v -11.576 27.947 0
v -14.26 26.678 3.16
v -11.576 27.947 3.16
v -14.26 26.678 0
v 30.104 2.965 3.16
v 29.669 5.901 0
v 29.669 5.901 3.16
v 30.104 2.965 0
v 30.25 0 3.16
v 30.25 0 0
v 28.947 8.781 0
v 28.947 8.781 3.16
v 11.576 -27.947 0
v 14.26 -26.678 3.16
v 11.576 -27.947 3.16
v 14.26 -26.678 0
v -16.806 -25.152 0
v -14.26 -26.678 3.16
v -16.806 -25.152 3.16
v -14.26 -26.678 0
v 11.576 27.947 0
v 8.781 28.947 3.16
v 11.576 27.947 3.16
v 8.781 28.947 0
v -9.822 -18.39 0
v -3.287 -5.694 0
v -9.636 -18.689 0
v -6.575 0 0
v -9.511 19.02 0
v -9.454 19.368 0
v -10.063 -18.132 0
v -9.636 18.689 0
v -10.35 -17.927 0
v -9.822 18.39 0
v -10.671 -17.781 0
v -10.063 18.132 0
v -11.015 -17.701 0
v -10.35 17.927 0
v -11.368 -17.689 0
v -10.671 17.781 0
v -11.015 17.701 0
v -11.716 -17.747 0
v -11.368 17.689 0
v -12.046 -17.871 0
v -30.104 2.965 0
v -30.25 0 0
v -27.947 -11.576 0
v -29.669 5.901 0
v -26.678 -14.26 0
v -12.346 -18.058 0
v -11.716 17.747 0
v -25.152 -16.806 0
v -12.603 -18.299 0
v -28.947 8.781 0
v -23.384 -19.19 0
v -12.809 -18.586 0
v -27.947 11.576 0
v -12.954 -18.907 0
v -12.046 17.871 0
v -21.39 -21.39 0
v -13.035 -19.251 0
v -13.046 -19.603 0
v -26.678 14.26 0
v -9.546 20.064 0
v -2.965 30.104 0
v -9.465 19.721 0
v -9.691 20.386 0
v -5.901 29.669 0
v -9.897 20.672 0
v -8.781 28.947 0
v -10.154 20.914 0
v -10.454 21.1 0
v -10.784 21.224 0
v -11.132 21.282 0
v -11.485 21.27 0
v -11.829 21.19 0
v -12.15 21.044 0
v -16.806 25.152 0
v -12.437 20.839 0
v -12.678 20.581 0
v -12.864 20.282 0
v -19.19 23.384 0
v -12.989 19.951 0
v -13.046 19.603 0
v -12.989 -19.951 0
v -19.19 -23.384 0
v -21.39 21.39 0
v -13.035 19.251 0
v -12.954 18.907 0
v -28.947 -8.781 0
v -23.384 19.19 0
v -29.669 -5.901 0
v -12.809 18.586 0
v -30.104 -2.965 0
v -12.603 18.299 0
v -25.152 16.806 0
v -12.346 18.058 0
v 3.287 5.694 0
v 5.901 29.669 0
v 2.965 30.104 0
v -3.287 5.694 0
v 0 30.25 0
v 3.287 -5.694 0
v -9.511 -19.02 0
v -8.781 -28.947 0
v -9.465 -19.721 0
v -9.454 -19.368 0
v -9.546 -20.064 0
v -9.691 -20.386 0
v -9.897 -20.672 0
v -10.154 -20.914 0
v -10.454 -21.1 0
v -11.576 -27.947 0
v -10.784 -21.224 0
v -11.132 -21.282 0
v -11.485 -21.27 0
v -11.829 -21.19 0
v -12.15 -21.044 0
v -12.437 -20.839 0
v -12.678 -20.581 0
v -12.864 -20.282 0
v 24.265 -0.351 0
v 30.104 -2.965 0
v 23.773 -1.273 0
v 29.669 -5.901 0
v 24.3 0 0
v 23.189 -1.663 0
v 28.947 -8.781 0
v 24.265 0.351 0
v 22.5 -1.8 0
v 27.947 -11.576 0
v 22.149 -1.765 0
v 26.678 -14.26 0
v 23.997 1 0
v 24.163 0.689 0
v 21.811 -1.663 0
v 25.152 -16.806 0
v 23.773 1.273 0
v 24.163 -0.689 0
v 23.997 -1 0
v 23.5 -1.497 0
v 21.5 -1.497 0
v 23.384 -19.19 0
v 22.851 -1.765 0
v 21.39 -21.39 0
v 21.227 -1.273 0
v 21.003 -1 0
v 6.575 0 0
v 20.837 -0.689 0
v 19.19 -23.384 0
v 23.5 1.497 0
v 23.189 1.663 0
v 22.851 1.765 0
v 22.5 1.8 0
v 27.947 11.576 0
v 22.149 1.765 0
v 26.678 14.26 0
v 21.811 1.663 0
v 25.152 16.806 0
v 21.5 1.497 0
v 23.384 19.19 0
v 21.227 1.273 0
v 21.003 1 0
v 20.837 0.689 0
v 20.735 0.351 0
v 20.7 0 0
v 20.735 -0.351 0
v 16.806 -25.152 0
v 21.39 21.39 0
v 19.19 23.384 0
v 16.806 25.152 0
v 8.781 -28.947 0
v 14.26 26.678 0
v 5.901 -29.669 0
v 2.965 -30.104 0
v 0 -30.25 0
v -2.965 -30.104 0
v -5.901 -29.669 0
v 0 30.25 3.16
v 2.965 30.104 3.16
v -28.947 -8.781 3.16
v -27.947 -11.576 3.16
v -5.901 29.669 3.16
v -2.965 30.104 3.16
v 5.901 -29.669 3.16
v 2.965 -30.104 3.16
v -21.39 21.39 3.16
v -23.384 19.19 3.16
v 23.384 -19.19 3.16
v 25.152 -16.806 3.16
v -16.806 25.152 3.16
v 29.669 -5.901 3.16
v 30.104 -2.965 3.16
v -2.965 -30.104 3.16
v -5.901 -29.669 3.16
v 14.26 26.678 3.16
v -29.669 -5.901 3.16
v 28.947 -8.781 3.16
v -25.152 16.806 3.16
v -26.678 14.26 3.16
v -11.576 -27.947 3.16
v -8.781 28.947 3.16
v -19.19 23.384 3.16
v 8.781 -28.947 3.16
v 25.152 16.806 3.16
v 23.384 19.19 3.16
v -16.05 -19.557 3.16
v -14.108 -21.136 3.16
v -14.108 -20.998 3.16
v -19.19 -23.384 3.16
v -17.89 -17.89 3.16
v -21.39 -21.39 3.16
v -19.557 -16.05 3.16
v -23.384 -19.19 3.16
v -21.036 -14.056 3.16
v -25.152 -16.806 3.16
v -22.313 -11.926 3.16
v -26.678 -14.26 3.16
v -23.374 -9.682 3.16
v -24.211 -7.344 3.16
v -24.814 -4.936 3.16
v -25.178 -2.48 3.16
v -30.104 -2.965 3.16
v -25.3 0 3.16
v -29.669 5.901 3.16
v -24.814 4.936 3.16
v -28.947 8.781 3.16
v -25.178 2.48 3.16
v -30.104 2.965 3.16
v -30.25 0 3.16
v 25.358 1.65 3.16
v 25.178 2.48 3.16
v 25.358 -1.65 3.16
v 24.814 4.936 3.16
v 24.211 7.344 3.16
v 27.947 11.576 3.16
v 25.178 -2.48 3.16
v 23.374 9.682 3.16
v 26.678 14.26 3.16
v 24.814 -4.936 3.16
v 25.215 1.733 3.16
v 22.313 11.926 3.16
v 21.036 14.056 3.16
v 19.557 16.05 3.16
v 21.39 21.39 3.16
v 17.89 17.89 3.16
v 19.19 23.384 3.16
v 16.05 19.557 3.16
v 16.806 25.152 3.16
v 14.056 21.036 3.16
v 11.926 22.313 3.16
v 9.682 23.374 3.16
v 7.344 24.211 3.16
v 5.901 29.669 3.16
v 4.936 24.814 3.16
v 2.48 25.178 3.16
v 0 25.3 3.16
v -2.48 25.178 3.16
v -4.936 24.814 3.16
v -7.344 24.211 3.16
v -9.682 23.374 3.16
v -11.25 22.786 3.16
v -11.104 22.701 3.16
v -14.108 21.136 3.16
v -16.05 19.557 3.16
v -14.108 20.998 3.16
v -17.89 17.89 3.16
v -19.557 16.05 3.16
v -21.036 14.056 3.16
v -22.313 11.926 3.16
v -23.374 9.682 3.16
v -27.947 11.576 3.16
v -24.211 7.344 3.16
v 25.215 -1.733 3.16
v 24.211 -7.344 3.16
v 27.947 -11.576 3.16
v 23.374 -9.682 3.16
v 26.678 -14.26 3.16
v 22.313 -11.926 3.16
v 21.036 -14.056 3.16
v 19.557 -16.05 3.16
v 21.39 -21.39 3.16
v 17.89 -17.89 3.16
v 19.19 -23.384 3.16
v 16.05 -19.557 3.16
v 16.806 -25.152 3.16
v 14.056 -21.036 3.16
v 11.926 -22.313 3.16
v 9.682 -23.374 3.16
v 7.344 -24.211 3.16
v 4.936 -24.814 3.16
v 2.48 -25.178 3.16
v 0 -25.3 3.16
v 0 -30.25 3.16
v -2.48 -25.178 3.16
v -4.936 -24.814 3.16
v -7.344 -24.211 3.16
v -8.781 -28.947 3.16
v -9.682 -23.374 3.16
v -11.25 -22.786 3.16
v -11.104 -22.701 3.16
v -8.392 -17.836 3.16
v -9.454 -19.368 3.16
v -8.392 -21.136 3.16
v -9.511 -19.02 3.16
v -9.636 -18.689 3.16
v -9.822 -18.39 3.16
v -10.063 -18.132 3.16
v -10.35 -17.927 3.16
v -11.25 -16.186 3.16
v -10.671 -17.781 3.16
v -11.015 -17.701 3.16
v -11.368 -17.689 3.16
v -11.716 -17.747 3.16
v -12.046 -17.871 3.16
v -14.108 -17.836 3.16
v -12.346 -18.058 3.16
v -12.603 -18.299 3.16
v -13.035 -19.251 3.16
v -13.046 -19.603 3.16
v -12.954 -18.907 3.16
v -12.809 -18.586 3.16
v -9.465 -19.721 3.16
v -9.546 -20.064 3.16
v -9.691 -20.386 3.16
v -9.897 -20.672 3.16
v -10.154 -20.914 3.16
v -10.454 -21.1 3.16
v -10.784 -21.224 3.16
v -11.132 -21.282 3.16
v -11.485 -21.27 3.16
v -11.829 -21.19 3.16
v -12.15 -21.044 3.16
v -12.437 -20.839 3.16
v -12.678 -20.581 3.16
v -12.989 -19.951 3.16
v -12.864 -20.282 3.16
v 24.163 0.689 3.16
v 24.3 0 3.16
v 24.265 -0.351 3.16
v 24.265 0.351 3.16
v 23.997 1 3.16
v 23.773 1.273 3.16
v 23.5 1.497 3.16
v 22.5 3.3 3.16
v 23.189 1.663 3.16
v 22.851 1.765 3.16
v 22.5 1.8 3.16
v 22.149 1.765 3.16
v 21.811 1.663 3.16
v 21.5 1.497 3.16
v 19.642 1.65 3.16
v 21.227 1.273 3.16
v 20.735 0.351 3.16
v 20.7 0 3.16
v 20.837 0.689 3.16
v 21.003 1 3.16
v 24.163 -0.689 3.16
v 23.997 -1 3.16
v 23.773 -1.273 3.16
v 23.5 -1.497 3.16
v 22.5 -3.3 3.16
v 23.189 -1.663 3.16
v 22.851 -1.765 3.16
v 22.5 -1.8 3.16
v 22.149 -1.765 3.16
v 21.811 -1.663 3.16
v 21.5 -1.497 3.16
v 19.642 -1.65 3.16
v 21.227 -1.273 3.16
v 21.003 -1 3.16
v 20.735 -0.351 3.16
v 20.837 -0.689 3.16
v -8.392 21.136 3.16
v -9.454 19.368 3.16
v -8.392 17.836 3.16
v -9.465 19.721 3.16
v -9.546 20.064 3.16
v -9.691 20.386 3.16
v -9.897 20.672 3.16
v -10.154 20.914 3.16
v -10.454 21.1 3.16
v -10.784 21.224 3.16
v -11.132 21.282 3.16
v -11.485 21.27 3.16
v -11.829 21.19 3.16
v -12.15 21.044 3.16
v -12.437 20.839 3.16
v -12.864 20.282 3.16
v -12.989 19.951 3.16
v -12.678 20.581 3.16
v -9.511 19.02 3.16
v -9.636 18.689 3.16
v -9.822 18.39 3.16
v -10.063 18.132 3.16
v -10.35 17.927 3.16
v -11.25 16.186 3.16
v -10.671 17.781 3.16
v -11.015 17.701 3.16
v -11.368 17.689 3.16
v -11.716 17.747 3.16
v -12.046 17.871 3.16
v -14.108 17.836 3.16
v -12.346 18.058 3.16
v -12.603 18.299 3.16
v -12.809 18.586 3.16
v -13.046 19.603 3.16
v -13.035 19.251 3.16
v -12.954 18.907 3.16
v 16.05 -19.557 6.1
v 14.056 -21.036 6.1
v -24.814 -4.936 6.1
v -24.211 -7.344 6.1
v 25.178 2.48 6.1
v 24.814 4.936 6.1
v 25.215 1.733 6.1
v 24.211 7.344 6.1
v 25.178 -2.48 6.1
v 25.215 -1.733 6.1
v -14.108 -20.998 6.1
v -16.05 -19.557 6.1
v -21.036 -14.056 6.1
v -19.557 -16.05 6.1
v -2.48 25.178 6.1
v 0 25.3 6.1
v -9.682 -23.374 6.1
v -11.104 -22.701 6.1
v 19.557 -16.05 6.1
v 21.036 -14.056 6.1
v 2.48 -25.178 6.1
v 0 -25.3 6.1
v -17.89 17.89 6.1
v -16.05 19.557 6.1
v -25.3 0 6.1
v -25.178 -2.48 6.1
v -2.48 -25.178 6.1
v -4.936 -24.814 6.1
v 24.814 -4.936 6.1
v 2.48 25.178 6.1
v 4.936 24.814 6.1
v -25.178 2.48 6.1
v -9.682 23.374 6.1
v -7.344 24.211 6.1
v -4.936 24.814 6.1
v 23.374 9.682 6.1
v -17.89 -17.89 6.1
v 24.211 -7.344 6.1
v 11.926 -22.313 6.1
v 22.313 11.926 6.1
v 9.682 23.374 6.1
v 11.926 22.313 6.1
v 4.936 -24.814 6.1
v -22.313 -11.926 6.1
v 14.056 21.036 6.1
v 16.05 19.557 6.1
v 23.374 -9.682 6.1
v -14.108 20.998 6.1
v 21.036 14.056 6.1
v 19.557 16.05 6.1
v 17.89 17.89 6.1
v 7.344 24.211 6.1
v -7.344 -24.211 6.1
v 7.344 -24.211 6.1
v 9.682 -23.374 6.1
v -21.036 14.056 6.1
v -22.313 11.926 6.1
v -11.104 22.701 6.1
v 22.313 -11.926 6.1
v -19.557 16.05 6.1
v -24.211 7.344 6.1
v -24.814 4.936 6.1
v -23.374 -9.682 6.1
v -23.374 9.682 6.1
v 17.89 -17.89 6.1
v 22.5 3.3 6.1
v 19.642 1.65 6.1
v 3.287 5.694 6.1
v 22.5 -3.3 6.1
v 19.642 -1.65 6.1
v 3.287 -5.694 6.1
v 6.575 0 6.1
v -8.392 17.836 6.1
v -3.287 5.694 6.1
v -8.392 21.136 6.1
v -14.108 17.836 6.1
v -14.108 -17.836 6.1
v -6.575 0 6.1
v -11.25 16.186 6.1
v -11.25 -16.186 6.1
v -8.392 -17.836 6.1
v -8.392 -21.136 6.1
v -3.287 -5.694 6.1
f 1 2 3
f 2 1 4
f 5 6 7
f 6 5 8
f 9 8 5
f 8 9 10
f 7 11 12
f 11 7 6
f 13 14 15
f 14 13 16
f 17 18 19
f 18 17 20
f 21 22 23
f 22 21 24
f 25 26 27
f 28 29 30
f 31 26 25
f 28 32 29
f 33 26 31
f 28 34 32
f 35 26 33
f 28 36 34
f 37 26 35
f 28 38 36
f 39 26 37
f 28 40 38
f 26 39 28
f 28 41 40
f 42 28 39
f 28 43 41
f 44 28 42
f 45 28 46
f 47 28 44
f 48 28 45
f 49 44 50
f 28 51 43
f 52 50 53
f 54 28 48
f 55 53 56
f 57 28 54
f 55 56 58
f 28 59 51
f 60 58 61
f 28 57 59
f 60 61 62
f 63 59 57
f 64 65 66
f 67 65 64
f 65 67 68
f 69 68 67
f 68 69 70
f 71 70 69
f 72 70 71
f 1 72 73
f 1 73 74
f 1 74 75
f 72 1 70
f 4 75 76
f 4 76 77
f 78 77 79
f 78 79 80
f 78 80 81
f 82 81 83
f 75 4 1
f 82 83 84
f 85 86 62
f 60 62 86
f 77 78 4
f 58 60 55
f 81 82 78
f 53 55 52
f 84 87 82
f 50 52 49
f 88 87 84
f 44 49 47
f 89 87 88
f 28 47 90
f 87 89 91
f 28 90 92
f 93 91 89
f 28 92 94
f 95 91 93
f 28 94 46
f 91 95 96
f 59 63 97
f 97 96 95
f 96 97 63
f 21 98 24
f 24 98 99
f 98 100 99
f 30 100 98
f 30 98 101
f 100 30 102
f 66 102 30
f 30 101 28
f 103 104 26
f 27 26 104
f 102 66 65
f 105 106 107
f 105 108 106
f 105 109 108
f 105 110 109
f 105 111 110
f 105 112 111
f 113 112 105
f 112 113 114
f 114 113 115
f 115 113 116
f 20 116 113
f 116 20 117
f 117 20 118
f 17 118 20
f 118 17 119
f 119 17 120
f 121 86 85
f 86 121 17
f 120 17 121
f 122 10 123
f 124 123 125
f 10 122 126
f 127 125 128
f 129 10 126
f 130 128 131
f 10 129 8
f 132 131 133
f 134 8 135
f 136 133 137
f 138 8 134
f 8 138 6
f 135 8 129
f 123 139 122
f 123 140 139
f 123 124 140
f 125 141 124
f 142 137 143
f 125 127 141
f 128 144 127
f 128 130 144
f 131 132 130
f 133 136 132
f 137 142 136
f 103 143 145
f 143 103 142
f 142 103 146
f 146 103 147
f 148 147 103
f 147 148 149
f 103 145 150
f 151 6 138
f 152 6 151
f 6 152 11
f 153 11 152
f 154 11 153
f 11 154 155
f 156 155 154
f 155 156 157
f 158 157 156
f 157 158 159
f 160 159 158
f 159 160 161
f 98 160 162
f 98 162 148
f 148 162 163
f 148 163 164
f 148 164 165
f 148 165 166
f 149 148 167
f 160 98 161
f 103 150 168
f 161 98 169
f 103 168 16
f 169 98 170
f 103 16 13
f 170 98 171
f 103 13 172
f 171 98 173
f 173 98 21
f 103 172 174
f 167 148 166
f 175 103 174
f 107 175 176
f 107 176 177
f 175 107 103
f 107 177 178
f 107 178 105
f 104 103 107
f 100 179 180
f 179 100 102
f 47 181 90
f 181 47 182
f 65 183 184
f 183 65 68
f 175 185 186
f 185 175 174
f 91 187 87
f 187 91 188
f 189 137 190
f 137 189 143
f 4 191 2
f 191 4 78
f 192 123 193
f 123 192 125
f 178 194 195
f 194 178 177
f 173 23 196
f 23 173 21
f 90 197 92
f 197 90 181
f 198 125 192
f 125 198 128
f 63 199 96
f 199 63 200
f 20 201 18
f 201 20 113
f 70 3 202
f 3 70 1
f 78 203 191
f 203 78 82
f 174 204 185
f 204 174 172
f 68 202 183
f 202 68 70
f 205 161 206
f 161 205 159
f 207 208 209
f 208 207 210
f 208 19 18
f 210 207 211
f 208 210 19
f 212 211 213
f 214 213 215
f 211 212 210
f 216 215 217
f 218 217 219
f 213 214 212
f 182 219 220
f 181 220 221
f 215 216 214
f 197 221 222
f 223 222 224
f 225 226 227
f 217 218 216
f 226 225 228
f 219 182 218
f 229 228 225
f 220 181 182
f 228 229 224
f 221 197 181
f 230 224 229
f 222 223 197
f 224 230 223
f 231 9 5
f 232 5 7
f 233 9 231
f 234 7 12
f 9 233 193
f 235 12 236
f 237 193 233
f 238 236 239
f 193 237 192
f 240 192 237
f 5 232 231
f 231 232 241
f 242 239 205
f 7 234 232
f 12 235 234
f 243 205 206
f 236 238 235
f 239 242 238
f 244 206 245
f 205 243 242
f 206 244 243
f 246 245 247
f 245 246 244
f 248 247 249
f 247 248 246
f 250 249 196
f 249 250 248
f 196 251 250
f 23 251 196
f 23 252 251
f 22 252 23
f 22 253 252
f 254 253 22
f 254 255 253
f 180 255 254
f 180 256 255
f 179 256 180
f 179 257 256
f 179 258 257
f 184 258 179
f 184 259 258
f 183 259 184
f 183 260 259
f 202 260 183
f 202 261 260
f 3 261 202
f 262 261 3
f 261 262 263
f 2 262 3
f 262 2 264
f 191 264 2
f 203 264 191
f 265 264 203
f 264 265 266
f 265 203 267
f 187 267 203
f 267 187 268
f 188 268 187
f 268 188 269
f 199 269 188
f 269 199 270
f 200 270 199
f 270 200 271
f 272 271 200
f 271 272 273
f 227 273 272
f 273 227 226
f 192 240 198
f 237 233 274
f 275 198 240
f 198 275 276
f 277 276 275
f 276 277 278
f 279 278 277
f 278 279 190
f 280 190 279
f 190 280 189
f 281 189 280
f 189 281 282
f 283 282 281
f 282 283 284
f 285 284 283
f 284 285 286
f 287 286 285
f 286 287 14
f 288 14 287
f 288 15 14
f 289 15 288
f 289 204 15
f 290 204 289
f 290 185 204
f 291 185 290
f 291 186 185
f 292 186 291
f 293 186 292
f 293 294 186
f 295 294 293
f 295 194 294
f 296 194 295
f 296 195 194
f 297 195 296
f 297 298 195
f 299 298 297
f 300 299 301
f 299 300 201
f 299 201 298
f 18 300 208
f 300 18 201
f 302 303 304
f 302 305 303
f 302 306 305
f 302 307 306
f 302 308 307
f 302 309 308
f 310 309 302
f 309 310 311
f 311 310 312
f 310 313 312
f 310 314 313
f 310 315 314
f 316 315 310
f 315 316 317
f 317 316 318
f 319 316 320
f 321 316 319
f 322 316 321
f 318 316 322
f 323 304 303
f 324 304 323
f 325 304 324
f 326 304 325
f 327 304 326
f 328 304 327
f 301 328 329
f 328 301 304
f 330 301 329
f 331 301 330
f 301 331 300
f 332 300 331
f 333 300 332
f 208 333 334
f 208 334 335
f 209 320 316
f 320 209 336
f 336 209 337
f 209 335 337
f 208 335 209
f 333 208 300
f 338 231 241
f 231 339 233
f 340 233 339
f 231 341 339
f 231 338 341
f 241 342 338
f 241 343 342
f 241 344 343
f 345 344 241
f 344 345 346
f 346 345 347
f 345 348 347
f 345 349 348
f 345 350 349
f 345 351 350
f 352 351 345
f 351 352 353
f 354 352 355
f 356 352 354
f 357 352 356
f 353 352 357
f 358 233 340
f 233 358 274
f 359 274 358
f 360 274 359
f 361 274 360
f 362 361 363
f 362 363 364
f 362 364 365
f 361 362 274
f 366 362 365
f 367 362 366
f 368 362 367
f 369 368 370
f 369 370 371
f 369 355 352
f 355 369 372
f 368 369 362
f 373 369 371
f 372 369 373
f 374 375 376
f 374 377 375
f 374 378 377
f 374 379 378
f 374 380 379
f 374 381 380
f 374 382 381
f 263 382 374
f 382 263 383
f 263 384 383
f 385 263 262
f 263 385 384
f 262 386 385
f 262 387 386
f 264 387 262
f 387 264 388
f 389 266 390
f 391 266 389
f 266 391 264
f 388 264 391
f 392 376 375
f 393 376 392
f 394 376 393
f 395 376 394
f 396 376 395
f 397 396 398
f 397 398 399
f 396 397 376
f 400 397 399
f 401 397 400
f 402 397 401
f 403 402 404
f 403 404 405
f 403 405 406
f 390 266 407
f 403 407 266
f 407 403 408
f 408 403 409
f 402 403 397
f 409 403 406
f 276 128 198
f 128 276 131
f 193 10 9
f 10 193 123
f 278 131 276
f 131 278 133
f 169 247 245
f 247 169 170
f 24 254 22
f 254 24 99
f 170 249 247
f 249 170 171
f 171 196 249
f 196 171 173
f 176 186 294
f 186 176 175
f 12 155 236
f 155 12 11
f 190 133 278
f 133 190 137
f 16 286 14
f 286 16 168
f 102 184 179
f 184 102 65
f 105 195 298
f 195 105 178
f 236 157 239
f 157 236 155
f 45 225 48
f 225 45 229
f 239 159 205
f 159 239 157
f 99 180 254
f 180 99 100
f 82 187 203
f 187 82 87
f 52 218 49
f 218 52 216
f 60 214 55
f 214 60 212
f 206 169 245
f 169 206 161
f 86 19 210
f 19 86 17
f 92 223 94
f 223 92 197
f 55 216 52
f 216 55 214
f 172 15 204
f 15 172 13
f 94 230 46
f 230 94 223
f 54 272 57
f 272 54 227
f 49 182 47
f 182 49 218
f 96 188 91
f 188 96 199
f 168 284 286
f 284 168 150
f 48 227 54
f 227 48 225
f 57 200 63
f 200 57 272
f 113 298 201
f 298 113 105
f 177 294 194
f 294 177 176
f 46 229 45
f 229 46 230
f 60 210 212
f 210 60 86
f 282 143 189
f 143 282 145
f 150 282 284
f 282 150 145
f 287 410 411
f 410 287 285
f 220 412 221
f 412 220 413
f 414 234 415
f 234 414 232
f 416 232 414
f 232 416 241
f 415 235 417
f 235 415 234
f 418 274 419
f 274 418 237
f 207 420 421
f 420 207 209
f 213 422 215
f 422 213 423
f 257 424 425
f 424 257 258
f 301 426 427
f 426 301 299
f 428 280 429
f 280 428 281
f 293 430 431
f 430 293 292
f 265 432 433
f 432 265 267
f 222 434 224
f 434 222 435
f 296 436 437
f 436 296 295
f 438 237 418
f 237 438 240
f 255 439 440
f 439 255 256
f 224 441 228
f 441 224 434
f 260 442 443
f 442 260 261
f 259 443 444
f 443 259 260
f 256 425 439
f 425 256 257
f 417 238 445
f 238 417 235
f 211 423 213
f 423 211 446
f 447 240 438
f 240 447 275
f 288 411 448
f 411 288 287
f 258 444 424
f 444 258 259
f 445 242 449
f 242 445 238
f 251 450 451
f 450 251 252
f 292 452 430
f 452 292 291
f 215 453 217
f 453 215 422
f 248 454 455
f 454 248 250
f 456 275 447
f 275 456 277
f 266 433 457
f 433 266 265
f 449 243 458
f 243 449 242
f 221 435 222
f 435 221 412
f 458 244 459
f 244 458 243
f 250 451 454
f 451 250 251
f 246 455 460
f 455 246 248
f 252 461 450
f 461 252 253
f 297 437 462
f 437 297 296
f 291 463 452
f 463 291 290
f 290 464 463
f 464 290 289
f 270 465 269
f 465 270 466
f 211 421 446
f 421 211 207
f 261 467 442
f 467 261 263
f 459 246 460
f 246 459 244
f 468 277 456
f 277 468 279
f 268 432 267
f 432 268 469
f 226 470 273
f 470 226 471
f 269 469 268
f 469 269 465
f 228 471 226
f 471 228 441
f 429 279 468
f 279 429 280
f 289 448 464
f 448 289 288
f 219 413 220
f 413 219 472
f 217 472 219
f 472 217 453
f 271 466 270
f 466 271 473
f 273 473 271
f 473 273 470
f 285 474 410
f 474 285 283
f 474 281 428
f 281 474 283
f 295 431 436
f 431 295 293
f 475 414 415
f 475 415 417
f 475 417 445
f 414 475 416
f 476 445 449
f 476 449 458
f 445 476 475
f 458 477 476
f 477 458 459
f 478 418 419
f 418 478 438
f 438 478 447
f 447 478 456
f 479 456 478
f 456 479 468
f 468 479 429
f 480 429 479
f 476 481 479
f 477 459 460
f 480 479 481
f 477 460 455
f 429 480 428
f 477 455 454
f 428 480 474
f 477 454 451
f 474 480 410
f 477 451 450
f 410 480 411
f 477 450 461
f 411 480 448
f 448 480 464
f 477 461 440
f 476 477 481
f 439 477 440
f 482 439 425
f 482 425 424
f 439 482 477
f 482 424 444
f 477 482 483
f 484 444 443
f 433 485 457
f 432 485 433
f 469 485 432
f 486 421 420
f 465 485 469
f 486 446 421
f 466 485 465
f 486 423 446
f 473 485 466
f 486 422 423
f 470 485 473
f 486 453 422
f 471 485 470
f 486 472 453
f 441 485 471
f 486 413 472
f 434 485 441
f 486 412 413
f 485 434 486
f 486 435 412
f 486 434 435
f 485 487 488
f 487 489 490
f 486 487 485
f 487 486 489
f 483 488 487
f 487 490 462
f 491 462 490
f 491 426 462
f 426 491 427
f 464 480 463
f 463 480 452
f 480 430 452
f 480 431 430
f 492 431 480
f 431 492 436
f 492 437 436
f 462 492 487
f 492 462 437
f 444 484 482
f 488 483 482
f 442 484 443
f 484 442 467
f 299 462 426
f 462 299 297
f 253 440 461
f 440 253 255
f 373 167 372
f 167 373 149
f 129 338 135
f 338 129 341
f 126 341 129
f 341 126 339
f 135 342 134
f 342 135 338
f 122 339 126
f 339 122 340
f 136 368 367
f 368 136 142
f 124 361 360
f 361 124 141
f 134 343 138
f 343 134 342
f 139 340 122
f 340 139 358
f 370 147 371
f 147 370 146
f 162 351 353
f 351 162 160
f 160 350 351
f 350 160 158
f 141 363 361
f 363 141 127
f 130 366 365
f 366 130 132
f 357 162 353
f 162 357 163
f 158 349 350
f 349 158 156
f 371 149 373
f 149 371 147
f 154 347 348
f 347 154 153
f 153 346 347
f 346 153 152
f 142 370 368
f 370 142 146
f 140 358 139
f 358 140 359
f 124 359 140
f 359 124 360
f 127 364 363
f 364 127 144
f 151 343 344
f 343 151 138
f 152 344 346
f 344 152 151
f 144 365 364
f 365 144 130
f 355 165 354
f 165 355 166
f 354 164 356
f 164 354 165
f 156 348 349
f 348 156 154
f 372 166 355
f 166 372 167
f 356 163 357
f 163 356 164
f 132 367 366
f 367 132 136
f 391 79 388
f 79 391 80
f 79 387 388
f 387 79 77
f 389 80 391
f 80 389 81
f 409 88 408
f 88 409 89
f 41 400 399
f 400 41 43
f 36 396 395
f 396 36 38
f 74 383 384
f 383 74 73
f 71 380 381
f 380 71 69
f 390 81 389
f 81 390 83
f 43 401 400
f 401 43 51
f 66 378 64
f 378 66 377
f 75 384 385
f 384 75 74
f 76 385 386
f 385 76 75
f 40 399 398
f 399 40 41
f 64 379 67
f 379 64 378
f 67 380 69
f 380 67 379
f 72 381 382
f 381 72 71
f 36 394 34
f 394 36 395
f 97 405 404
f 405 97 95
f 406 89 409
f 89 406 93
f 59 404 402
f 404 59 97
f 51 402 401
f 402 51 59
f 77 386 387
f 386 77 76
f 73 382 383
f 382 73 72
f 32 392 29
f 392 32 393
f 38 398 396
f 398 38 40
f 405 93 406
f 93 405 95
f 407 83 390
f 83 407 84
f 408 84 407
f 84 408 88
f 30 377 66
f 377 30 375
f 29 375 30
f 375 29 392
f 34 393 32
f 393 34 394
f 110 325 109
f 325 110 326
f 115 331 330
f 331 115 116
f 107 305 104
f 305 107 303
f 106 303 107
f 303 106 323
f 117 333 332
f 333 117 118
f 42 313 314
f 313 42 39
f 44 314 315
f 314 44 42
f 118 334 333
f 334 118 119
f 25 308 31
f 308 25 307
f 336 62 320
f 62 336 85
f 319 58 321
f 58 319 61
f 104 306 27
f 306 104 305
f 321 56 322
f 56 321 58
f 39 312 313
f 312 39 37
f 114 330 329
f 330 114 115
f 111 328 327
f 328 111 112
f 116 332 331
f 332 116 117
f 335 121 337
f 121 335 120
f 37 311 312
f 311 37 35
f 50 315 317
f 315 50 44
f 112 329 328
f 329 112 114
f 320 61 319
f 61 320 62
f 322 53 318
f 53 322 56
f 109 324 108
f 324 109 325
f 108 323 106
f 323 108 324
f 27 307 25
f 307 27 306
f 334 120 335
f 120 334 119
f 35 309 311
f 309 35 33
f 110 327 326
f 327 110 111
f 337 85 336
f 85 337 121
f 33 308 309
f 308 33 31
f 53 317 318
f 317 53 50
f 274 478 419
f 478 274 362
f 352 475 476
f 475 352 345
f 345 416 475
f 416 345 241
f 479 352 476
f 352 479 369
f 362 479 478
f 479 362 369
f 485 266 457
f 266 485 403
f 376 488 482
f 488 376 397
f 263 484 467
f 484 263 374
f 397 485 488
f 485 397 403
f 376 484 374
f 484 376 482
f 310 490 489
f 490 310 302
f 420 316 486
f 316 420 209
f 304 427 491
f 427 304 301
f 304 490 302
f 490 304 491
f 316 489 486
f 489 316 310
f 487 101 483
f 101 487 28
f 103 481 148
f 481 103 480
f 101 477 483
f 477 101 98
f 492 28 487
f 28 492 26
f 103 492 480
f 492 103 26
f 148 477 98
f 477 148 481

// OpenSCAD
$fn=64;
overlap = 0.1;

module solid(){
union() {
cylinder(h=3.16, d=60.5);
translate([0,0,overlap]) color("green") cylinder(h=6.1-overlap, d=50.6);
}
}

module remove(){
    union(){
linear_extrude(height = 20, center = true, convexity = 10) circle(r=13.15/2, $fn=6);
        for (a =[0:2]) rotate([0,0,120*a]) color("red") translate([22.5,0,-overlap]) cylinder(h=10, d=3.6, $fn=32);
    
for (a =[0:2]) rotate([0,0,120*a]) color("red") translate([22.5,0,3.16]) rotate([0,0,30]) cylinder(h=10, d=6.6, $fn=6);
    }
}

difference(){
    solid();
    remove();
}
